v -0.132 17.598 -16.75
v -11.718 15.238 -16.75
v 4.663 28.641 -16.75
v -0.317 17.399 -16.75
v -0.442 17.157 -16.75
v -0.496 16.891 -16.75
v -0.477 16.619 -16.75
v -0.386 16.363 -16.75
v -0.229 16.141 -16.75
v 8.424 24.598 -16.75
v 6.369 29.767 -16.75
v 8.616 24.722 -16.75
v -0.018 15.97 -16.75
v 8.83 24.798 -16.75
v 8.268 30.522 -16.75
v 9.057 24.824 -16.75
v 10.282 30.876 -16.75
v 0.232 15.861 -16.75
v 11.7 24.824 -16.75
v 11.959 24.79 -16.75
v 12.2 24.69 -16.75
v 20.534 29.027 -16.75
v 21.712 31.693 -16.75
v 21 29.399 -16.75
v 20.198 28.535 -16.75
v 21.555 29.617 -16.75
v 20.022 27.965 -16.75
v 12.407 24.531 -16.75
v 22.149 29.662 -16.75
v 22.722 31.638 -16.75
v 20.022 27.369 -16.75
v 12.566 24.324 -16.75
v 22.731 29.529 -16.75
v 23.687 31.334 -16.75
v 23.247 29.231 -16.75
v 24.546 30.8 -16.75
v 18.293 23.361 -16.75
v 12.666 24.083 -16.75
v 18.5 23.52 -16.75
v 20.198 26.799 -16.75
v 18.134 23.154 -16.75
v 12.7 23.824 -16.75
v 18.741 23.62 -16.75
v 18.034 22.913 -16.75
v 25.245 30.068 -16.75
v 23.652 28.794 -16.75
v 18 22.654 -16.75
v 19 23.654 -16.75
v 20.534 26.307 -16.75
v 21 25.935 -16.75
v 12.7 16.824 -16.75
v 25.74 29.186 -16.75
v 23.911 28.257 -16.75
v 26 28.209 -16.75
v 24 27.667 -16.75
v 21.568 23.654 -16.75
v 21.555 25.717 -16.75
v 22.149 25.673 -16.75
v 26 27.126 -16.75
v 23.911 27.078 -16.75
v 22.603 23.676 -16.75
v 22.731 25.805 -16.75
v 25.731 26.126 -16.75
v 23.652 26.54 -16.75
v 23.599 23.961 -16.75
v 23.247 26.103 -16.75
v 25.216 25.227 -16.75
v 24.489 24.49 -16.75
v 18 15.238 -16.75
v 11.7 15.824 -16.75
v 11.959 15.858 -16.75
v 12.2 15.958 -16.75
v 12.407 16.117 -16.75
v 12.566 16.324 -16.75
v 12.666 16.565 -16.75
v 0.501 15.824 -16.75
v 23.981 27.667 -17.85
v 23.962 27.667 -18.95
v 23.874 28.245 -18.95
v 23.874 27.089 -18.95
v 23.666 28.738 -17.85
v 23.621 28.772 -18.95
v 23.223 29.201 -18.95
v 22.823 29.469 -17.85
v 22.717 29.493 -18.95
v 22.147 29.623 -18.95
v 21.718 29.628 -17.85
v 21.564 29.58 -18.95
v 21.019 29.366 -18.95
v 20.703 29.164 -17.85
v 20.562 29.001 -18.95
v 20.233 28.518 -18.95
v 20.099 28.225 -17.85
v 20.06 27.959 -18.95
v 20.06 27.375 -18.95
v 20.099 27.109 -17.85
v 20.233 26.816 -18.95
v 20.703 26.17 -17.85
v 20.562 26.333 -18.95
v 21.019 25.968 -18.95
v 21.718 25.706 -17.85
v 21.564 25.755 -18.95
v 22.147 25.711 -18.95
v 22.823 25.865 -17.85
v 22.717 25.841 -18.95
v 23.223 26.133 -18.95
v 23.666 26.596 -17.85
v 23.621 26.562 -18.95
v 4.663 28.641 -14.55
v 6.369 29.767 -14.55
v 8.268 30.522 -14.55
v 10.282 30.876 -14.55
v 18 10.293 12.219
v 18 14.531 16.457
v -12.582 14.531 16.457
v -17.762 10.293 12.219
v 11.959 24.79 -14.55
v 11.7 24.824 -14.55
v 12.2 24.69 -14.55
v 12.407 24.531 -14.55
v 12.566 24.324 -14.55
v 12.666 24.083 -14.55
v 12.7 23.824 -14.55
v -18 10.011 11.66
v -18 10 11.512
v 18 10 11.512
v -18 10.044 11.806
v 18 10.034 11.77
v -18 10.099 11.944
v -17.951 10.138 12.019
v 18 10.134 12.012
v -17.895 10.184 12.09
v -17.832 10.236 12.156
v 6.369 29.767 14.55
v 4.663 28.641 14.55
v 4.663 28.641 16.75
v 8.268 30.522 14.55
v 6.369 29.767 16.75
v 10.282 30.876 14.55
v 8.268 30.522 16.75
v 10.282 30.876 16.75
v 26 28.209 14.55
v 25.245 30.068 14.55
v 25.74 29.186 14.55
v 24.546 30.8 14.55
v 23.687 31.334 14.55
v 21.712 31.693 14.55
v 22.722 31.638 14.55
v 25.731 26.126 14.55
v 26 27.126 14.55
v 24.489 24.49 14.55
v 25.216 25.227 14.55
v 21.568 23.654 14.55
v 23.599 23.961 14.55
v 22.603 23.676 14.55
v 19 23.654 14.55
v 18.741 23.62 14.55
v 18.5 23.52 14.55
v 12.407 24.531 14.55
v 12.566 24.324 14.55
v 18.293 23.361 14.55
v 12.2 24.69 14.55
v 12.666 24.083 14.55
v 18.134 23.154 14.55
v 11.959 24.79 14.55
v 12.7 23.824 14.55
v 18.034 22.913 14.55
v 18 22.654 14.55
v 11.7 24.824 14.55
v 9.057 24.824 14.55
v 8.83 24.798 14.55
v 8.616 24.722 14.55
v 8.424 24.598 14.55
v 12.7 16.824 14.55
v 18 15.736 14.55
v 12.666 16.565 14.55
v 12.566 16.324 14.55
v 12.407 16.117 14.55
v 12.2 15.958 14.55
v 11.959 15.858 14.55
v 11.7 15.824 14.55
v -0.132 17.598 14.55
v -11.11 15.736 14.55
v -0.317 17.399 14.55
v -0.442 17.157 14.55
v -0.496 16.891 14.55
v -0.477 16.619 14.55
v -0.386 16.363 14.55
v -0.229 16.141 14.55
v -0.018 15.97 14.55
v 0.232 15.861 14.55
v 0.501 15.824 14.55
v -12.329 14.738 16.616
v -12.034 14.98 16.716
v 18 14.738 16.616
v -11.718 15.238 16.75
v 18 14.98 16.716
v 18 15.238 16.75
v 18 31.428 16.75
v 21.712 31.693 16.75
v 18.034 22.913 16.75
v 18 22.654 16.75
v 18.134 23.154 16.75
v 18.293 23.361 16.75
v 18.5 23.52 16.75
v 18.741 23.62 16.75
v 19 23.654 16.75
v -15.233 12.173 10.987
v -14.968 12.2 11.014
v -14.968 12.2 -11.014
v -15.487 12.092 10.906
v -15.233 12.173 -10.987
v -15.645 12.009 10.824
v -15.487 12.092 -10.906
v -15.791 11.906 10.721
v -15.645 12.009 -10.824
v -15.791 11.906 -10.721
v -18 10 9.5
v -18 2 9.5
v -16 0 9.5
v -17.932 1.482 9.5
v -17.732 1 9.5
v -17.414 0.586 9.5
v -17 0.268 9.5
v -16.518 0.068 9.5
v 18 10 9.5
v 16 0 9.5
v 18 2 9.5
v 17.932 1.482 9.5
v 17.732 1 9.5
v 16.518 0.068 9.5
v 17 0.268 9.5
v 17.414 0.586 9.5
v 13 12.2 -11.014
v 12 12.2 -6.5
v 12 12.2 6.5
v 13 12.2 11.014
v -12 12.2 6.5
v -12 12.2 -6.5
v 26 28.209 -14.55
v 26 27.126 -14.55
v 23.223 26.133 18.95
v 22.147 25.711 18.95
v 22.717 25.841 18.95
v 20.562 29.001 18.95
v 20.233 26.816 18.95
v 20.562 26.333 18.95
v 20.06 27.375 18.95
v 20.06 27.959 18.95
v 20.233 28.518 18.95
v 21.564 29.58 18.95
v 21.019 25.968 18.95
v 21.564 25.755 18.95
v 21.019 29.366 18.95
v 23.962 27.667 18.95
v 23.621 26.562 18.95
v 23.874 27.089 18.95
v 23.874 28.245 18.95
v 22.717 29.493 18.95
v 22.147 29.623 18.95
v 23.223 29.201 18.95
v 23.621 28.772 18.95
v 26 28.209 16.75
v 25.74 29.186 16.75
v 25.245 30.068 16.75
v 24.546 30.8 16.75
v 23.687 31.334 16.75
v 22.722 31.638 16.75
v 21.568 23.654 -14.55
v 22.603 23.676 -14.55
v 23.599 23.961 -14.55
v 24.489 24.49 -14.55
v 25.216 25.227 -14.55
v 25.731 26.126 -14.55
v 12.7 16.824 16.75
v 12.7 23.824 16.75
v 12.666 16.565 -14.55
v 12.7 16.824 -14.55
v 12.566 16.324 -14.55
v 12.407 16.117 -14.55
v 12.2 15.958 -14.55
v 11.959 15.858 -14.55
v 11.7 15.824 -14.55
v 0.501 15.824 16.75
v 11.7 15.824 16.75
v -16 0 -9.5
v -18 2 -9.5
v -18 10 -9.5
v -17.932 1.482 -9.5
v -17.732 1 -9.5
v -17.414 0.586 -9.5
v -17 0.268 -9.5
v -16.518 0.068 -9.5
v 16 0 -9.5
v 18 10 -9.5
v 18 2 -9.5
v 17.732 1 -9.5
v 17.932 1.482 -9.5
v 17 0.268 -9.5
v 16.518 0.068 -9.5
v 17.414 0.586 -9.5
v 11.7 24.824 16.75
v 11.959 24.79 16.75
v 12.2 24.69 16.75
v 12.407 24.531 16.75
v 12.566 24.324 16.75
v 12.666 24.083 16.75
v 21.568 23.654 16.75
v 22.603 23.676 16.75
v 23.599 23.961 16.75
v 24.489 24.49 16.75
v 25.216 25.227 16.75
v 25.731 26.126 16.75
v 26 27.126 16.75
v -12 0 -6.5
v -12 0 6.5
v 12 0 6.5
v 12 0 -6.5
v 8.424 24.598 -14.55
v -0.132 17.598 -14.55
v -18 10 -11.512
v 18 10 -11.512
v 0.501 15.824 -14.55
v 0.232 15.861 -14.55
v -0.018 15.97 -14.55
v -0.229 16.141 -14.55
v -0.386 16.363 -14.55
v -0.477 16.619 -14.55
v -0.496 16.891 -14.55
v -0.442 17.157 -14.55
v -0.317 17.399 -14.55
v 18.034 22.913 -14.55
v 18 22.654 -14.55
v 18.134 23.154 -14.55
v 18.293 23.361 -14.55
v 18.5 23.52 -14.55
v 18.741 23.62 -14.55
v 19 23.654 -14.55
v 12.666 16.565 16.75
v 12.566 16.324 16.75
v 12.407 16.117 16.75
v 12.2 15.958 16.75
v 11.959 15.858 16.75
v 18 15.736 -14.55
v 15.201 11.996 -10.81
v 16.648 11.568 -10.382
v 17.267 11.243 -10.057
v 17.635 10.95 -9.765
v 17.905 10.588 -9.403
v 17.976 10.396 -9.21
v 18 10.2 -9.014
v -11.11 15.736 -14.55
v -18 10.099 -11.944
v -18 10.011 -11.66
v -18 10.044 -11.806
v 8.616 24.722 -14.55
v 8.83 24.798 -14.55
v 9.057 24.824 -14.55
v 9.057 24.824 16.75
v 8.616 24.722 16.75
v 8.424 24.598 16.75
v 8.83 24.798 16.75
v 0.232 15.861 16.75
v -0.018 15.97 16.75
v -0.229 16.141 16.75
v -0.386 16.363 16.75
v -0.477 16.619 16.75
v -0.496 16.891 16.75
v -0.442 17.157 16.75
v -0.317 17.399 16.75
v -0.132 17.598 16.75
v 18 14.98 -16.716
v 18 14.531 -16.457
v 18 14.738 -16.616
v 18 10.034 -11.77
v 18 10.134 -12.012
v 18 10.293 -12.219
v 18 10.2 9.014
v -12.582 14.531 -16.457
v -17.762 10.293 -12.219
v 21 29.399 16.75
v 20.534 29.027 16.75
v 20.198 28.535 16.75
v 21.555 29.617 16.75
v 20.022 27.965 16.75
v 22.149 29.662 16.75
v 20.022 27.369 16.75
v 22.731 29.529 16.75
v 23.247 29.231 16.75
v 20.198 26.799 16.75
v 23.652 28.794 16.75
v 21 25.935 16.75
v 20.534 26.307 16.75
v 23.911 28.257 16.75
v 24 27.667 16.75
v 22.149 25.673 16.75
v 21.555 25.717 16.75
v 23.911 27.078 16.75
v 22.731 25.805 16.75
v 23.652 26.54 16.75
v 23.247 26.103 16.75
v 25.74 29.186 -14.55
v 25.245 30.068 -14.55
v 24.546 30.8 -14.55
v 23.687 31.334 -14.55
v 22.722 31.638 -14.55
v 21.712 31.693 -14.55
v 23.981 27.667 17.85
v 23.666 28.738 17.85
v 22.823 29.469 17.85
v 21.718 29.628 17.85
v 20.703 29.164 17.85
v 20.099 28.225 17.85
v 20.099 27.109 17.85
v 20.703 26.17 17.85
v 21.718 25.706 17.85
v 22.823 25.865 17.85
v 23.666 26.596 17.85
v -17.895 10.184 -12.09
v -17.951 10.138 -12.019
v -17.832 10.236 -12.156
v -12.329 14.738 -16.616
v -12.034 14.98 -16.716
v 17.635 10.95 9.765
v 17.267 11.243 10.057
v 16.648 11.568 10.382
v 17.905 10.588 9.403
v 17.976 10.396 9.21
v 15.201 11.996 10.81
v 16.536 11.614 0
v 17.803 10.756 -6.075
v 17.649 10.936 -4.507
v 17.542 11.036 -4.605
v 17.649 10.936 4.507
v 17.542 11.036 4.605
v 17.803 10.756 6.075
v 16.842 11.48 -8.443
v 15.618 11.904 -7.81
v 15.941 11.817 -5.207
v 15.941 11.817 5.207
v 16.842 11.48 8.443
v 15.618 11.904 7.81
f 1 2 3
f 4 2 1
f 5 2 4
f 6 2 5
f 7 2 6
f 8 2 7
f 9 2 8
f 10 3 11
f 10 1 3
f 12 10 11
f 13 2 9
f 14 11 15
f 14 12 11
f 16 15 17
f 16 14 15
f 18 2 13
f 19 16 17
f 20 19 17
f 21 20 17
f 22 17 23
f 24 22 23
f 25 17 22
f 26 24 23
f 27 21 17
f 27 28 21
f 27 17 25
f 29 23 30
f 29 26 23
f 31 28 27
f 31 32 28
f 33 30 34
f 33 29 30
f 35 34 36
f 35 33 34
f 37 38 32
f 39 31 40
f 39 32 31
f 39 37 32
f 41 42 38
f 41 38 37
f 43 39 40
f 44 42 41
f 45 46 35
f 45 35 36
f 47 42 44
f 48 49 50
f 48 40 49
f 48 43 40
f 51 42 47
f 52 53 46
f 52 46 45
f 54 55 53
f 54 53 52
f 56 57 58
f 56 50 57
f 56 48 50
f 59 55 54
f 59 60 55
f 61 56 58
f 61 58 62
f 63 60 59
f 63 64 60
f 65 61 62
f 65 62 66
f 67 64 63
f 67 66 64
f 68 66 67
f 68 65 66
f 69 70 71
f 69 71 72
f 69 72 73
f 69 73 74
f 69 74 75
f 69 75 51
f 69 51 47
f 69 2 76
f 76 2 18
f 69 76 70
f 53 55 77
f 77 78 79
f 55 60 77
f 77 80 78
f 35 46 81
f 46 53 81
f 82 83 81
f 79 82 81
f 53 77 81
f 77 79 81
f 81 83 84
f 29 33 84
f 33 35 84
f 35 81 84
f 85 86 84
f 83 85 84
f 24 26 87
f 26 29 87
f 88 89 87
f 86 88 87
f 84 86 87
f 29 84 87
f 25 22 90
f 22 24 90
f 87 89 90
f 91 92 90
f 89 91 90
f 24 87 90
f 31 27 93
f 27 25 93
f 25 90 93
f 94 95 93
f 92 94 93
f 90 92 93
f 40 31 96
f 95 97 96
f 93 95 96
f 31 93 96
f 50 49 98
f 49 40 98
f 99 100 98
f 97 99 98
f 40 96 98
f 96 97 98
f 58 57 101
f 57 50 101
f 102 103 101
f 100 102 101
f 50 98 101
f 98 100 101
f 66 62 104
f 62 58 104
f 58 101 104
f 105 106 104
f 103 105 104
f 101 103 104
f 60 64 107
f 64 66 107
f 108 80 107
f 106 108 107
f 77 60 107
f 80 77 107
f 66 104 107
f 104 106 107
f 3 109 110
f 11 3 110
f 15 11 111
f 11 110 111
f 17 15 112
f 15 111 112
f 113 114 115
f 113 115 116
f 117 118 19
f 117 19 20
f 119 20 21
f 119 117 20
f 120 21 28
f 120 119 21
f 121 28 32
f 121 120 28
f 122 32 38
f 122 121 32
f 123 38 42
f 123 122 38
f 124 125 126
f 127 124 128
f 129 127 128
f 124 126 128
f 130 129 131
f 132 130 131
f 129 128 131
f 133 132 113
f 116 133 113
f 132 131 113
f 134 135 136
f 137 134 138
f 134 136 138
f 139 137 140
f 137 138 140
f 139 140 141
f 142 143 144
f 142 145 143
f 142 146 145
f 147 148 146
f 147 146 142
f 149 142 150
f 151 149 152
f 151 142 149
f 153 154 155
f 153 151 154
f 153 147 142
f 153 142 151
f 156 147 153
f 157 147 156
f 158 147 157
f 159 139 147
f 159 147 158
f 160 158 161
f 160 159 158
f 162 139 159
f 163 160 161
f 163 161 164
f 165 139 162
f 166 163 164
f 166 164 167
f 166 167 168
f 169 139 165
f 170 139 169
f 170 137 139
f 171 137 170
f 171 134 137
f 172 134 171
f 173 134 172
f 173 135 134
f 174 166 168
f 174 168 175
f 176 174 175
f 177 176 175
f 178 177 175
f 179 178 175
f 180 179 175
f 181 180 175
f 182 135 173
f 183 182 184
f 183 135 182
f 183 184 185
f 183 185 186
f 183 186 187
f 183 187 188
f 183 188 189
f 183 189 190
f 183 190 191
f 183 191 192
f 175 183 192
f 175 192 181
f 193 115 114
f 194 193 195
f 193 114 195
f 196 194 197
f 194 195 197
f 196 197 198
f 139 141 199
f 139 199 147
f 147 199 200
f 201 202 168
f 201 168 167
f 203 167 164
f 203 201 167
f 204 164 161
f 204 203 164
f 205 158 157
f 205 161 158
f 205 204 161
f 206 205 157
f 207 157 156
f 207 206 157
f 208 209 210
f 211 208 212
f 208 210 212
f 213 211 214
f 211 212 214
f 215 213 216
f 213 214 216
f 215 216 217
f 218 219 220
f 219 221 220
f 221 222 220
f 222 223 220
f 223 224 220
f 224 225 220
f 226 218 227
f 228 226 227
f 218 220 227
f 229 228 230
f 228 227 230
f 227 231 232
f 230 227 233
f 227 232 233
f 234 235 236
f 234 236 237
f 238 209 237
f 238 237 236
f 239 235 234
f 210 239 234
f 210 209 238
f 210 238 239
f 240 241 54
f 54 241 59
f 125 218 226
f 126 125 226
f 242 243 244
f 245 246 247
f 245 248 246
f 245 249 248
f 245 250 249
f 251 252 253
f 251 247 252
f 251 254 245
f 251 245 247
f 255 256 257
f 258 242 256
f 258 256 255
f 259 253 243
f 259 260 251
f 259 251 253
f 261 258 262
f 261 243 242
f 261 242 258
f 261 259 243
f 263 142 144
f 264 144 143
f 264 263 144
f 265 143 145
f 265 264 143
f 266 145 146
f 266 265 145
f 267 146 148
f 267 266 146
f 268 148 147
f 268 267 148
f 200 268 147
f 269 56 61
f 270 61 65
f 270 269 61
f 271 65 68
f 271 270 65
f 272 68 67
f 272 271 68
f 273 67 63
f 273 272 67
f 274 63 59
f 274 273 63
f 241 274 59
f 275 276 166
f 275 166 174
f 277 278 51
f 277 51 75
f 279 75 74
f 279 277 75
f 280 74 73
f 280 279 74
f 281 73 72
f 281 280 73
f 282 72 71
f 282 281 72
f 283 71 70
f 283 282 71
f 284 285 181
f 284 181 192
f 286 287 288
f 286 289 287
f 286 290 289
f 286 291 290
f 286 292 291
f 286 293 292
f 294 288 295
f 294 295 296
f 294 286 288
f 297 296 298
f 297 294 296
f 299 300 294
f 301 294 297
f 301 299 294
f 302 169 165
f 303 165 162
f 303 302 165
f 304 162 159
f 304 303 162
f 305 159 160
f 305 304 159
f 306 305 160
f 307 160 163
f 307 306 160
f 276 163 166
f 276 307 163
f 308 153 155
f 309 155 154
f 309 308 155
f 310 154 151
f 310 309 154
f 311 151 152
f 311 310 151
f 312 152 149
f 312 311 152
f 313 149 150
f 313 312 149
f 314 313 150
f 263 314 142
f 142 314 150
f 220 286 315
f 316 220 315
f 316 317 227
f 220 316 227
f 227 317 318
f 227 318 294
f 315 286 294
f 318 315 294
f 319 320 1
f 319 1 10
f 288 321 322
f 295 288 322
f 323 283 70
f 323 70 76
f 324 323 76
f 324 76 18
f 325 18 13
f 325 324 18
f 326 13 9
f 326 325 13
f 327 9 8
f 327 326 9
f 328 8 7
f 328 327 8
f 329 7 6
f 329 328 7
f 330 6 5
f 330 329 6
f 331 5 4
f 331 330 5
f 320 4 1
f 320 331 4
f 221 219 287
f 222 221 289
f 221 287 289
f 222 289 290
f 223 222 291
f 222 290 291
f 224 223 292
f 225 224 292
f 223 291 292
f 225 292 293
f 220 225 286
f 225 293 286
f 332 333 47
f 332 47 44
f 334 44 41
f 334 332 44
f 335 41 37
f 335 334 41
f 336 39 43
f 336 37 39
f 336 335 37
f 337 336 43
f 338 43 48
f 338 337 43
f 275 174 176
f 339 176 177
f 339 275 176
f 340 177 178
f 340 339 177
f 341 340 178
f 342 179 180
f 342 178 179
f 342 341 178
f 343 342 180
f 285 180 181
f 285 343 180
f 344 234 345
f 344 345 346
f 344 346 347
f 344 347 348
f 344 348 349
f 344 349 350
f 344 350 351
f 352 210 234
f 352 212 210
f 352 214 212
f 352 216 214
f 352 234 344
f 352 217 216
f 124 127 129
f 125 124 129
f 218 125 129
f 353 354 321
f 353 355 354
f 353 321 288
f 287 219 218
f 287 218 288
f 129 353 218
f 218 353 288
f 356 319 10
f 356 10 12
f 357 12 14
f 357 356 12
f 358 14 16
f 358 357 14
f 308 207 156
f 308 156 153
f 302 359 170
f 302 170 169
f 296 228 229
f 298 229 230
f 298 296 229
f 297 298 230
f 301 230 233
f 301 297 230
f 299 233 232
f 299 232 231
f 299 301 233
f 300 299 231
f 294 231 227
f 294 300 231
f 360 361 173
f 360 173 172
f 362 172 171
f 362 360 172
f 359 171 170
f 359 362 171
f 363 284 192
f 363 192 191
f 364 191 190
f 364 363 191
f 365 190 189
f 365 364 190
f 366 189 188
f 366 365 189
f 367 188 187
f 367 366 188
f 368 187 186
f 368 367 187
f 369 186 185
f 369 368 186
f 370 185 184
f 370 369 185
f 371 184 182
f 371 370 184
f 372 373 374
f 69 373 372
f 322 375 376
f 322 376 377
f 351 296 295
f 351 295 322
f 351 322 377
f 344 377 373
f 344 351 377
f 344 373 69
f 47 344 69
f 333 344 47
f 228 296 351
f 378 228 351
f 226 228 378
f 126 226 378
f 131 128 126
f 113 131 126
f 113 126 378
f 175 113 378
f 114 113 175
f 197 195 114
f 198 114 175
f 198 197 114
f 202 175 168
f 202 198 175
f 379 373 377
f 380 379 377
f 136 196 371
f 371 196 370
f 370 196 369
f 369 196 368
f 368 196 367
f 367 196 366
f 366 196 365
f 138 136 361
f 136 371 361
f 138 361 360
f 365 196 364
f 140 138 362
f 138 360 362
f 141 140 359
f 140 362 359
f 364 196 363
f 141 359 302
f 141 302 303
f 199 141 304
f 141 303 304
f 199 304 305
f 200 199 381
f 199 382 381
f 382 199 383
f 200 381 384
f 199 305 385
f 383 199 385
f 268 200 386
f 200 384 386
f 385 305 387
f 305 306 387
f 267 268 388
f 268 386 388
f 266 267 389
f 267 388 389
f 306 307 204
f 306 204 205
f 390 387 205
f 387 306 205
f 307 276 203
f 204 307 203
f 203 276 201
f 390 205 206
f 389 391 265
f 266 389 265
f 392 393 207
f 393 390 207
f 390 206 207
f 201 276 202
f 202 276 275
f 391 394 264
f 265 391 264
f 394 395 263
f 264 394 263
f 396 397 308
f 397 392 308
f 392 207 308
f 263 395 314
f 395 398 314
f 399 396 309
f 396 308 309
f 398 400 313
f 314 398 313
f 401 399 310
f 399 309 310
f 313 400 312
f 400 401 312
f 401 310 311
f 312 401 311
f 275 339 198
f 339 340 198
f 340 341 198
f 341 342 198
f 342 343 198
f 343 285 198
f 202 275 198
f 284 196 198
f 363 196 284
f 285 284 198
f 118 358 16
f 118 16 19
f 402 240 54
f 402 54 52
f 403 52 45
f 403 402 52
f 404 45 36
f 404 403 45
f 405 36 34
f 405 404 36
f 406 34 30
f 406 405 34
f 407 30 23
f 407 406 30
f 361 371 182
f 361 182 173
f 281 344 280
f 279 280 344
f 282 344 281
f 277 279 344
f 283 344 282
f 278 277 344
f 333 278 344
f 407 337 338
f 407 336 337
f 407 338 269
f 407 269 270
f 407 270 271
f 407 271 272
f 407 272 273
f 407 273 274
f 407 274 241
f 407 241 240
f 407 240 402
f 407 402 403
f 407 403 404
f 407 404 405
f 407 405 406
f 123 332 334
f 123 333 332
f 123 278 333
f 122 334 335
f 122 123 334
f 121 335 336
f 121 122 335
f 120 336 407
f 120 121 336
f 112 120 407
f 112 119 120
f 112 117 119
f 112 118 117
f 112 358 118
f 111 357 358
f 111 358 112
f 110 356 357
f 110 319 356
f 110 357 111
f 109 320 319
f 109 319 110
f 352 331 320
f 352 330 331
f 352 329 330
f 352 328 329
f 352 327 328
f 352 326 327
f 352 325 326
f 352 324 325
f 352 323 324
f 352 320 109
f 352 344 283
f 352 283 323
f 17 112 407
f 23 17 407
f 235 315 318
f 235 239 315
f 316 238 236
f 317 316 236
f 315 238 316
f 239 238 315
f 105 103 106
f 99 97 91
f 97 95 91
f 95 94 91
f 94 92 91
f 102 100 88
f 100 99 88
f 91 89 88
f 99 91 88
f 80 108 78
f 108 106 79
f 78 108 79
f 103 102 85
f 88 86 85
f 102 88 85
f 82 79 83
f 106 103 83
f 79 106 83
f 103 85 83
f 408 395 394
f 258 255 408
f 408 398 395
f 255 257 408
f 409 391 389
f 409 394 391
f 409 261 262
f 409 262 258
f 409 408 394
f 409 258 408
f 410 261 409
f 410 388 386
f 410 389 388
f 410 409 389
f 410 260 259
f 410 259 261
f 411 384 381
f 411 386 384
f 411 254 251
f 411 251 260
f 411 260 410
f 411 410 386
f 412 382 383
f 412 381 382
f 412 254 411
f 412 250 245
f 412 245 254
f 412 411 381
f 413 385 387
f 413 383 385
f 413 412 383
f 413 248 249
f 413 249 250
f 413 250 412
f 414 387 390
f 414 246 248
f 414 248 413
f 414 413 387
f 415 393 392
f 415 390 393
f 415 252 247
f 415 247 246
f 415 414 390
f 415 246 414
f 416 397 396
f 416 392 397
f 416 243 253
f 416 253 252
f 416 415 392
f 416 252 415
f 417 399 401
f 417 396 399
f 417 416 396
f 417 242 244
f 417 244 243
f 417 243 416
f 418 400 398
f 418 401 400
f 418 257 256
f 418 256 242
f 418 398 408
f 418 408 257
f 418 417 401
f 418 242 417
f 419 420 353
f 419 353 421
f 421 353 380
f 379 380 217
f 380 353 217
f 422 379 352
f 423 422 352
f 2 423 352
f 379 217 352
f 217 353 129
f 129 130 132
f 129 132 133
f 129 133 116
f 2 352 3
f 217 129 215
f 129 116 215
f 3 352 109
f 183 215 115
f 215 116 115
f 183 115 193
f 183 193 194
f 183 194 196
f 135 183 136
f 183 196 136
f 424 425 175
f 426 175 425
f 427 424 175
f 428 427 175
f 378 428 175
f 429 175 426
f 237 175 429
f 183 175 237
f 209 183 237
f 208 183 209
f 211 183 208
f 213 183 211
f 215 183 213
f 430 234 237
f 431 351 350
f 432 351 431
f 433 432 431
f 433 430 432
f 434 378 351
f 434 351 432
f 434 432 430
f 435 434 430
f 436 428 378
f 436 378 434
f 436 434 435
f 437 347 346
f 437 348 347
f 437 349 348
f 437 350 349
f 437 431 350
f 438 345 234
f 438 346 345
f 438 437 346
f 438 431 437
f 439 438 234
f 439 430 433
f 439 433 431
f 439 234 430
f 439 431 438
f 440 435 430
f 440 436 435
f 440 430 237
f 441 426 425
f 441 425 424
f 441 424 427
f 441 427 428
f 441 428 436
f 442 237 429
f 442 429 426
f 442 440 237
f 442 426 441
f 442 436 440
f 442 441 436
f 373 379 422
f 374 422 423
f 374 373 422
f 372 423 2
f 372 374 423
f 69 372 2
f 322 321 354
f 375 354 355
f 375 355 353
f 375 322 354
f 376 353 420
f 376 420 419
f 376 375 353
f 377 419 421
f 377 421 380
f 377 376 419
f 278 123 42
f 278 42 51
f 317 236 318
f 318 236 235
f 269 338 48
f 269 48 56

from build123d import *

# Parameters (mm, degrees)
SKETCH1_W           = 36
SKETCH1_H           = 19
BOSS_EXTRUDE1_DEPTH = 10
SKETCH2_W           = 24
SKETCH2_H           = 13
CUT_EXTRUDE1_DEPTH  = 10
SKETCH3_W           = 44
SKETCH3_H           = 33.5
BOSS_EXTRUDE2_DEPTH = 22
CUT_EXTRUDE2_REACH  = 58.926
CUT_EXTRUDE3_REACH  = 58.926
CUT_EXTRUDE4_DEPTH  = 54.124852941
CUT_EXTRUDE6_DEPTH  = 54.124852941
CUT_EXTRUDE7_DEPTH  = 54.124852941
SKETCH12_R          = 2
BOSS_EXTRUDE3_DEPTH = 2.2
BOSS_EXTRUDE3_TAPER = 1
CUT_EXTRUDE8_REACH  = 40.809
SKETCH13_W          = 24
SKETCH13_H          = 13
FILLET1_R           = 2
FILLET2_R           = 1
FILLET4_SIZE        = 2
FILLET4_SIZE_2      = 5
FILLET5_R           = 1.3


with BuildPart() as part:
    # Sketch1 → Boss-Extrude1 (new body)
    with BuildSketch(Plane(origin=(0, 0, 0), x_dir=(1, 0, 0), z_dir=(0, 1, 0))):
        Rectangle(SKETCH1_W, SKETCH1_H)
    extrude(amount=BOSS_EXTRUDE1_DEPTH)

    # Sketch2 → Cut-Extrude1 (cut)
    with BuildSketch(Plane(origin=(0, 10, 0), x_dir=(1, 0, 0), z_dir=(0, 1, 0))):
        Rectangle(SKETCH2_W, SKETCH2_H)
    extrude(amount=-CUT_EXTRUDE1_DEPTH, mode=Mode.SUBTRACT)

    # Sketch3 → Boss-Extrude2 (add)
    with BuildSketch(Plane(origin=(0, 10, 0), x_dir=(1, 0, 0), z_dir=(0, 1, 0))):
        with Locations((4, 0)):
            Rectangle(SKETCH3_W, SKETCH3_H)
    extrude(amount=BOSS_EXTRUDE2_DEPTH)

    # Sketch5 → Cut-Extrude2 (cut, up to next)
    with BuildSketch(Plane.ZY.offset(18), mode=Mode.PRIVATE) as cut_extrude2_sk1:
        Polygon((-14.55, 32), (14.55, 32), (14.55, 15.735533906), (11.014466094, 12.2), (-11.014466094, 12.2), (-14.55, 15.735533906), align=None)
    cut_extrude2_tool1 = extrude(cut_extrude2_sk1.sketch, amount=-CUT_EXTRUDE2_REACH, mode=Mode.PRIVATE) & part.part
    add(cut_extrude2_tool1.solids().sort_by_distance((-18, 22.293405, 0))[0], mode=Mode.SUBTRACT)

    # Sketch7 → Cut-Extrude3 (cut, up to next)
    with BuildSketch(Plane.ZY.offset(18), mode=Mode.PRIVATE) as cut_extrude3_sk1:
        Polygon((-16.75, 14.824264069), (-11.925735931, 10), (-16.75, 10), align=None)
    cut_extrude3_tool1 = extrude(cut_extrude3_sk1.sketch, amount=-CUT_EXTRUDE3_REACH, mode=Mode.PRIVATE) & part.part
    # Sketch7 → Cut-Extrude3 (cut, up to next)
    with BuildSketch(Plane.ZY.offset(18), mode=Mode.PRIVATE) as cut_extrude3_sk2:
        Polygon((16.75, 14.824264069), (11.925735931, 10), (16.75, 10), align=None)
    cut_extrude3_tool2 = extrude(cut_extrude3_sk2.sketch, amount=-CUT_EXTRUDE3_REACH, mode=Mode.PRIVATE) & part.part
    add(cut_extrude3_tool1.solids().sort_by_distance((-18, 11.608088, -15.141912))[0], mode=Mode.SUBTRACT)
    add(cut_extrude3_tool2.solids().sort_by_distance((-18, 11.608088, 15.141912))[0], mode=Mode.SUBTRACT)

    # Sketch9 → Cut-Extrude4 (cut, through all)
    with BuildSketch(Plane.XY.offset(16.75)):
        with BuildLine():
            Line((12.7, 23.824264069), (12.7, 16.824264069))
            ThreePointArc((12.7, 16.824264069), (12.407106781, 16.117157288), (11.7, 15.824264069))
            Line((11.7, 15.824264069), (0.501407823, 15.824264069))
            ThreePointArc((0.501407823, 15.824264069), (-0.440387617, 16.488077587), (-0.131829968, 17.598221368))
            Line((-0.131829968, 17.598221368), (8.423725588, 24.598221368))
            ThreePointArc((8.423725588, 24.598221368), (8.720776897, 24.766059508), (9.056963378, 24.824264069))
            Line((9.056963378, 24.824264069), (11.7, 24.824264069))
            ThreePointArc((11.7, 24.824264069), (12.407106781, 24.53137085), (12.7, 23.824264069))
        make_face()
    extrude(amount=-CUT_EXTRUDE4_DEPTH, mode=Mode.SUBTRACT)

    # Sketch10 → Cut-Extrude6 (cut, through all)
    with BuildSketch(Plane.XY.offset(16.75)):
        with BuildLine():
            Line((-18, 10.098548576), (4.662823879, 28.640859022))
            ThreePointArc((4.662823879, 28.640859022), (7.299328616, 30.193246078), (10.281806361, 30.875806919))
            Line((10.281806361, 30.875806919), (26, 32))
            Line((26, 32), (-18, 32))
            Line((-18, 32), (-18, 10.098548576))
        make_face()
    extrude(amount=-CUT_EXTRUDE6_DEPTH, mode=Mode.SUBTRACT)

    # Sketch11 → Cut-Extrude7 (cut, through all)
    with BuildSketch(Plane.XY.offset(16.75)):
        with BuildLine():
            Line((18, 10), (18, 22.653857453))
            ThreePointArc((18, 22.653857453), (18.292893219, 23.360964234), (19, 23.653857453))
            Line((19, 23.653857453), (21.567861559, 23.653857453))
            ThreePointArc((21.567861559, 23.653857453), (26.035822704, 27.594752604), (21.71203996, 31.693317495))
            Line((21.71203996, 31.693317495), (18, 31.427825814))
            Line((18, 31.427825814), (18, 34.061365202))
            Line((18, 34.061365202), (30.208332635, 34.9345268))
            Line((30.208332635, 34.9345268), (29.247958423, 10))
            Line((29.247958423, 10), (18, 10))
        make_face()
    extrude(amount=-CUT_EXTRUDE7_DEPTH, mode=Mode.SUBTRACT)

    # Sketch12 → Boss-Extrude3 (add)
    with BuildSketch(Plane.XY.offset(16.75)):
        with Locations((22, 27.667130408)):
            Circle(SKETCH12_R)
    boss_extrude3 = extrude(amount=BOSS_EXTRUDE3_DEPTH, taper=BOSS_EXTRUDE3_TAPER)

    # Mirror1: Boss-Extrude3 across plane
    add(boss_extrude3.mirror(Plane.XY))

    # Sketch13 → Cut-Extrude8 (cut, up to next)
    with BuildSketch(Plane.XZ.offset(-10), mode=Mode.PRIVATE) as cut_extrude8_sk1:
        Rectangle(SKETCH13_W, SKETCH13_H)
    cut_extrude8_tool1 = extrude(cut_extrude8_sk1.sketch, amount=-CUT_EXTRUDE8_REACH, mode=Mode.PRIVATE) & part.part
    add(cut_extrude8_tool1.solids().sort_by_distance((0, 10, 0))[0], mode=Mode.SUBTRACT)

    # Fillet1
    fillet1_edges = [part.edges().sort_by_distance(p)[0] for p in [
        (-18, 0, 0),
        (18, 0, 0),
    ]]
    fillet(fillet1_edges, radius=FILLET1_R)

    # Fillet2
    fillet2_edges = [part.edges().sort_by_distance(p)[0] for p in [
        (2.887937246, 14.824264069, -16.75),
        (2.887937246, 14.824264069, 16.75),
        (0, 10, -11.925735931),
        (0, 10, 11.925735931),
    ]]
    fillet(fillet2_edges, radius=FILLET2_R)

    # Fillet4
    # a fillet whose section is not a circle: 5, 2 mm, written as the material it takes off along each edge
    with BuildSketch(Plane(origin=(18, 12.2, 23.514466094), x_dir=(0, -1, 0), z_dir=(0, 0, -1))) as fillet4_piece_1_section:
        with BuildLine():
            Bezier((FILLET4_SIZE, 0), (0, 0), (0, FILLET4_SIZE_2), weights=[1, 0.707106781, 1])
            Line((0, FILLET4_SIZE_2), (0, 0))
            Line((0, 0), (FILLET4_SIZE, 0))
        make_face()
    fillet4_piece_1 = extrude(amount=47.028932188, mode=Mode.PRIVATE)
    fillet4_piece_1 = split(fillet4_piece_1, bisect_by=Plane(origin=(18, 18.45, 17.264466094), z_dir=(0, 0.7071067811865465, -0.7071067811865486)), keep=Keep.TOP, mode=Mode.PRIVATE)
    fillet4_piece_1 = split(fillet4_piece_1, bisect_by=Plane(origin=(18, -5.064466094, 6.25), z_dir=(0, 0.7071067811865478, 0.7071067811865474)), keep=Keep.TOP, mode=Mode.PRIVATE)
    add(fillet4_piece_1, mode=Mode.SUBTRACT)

    # Fillet5
    fillet5_edges = [part.edges().sort_by_distance(p)[0] for p in [
        (-15.43155937, 12.2, 0),
    ]]
    fillet(fillet5_edges, radius=FILLET5_R)


solid = part.part
